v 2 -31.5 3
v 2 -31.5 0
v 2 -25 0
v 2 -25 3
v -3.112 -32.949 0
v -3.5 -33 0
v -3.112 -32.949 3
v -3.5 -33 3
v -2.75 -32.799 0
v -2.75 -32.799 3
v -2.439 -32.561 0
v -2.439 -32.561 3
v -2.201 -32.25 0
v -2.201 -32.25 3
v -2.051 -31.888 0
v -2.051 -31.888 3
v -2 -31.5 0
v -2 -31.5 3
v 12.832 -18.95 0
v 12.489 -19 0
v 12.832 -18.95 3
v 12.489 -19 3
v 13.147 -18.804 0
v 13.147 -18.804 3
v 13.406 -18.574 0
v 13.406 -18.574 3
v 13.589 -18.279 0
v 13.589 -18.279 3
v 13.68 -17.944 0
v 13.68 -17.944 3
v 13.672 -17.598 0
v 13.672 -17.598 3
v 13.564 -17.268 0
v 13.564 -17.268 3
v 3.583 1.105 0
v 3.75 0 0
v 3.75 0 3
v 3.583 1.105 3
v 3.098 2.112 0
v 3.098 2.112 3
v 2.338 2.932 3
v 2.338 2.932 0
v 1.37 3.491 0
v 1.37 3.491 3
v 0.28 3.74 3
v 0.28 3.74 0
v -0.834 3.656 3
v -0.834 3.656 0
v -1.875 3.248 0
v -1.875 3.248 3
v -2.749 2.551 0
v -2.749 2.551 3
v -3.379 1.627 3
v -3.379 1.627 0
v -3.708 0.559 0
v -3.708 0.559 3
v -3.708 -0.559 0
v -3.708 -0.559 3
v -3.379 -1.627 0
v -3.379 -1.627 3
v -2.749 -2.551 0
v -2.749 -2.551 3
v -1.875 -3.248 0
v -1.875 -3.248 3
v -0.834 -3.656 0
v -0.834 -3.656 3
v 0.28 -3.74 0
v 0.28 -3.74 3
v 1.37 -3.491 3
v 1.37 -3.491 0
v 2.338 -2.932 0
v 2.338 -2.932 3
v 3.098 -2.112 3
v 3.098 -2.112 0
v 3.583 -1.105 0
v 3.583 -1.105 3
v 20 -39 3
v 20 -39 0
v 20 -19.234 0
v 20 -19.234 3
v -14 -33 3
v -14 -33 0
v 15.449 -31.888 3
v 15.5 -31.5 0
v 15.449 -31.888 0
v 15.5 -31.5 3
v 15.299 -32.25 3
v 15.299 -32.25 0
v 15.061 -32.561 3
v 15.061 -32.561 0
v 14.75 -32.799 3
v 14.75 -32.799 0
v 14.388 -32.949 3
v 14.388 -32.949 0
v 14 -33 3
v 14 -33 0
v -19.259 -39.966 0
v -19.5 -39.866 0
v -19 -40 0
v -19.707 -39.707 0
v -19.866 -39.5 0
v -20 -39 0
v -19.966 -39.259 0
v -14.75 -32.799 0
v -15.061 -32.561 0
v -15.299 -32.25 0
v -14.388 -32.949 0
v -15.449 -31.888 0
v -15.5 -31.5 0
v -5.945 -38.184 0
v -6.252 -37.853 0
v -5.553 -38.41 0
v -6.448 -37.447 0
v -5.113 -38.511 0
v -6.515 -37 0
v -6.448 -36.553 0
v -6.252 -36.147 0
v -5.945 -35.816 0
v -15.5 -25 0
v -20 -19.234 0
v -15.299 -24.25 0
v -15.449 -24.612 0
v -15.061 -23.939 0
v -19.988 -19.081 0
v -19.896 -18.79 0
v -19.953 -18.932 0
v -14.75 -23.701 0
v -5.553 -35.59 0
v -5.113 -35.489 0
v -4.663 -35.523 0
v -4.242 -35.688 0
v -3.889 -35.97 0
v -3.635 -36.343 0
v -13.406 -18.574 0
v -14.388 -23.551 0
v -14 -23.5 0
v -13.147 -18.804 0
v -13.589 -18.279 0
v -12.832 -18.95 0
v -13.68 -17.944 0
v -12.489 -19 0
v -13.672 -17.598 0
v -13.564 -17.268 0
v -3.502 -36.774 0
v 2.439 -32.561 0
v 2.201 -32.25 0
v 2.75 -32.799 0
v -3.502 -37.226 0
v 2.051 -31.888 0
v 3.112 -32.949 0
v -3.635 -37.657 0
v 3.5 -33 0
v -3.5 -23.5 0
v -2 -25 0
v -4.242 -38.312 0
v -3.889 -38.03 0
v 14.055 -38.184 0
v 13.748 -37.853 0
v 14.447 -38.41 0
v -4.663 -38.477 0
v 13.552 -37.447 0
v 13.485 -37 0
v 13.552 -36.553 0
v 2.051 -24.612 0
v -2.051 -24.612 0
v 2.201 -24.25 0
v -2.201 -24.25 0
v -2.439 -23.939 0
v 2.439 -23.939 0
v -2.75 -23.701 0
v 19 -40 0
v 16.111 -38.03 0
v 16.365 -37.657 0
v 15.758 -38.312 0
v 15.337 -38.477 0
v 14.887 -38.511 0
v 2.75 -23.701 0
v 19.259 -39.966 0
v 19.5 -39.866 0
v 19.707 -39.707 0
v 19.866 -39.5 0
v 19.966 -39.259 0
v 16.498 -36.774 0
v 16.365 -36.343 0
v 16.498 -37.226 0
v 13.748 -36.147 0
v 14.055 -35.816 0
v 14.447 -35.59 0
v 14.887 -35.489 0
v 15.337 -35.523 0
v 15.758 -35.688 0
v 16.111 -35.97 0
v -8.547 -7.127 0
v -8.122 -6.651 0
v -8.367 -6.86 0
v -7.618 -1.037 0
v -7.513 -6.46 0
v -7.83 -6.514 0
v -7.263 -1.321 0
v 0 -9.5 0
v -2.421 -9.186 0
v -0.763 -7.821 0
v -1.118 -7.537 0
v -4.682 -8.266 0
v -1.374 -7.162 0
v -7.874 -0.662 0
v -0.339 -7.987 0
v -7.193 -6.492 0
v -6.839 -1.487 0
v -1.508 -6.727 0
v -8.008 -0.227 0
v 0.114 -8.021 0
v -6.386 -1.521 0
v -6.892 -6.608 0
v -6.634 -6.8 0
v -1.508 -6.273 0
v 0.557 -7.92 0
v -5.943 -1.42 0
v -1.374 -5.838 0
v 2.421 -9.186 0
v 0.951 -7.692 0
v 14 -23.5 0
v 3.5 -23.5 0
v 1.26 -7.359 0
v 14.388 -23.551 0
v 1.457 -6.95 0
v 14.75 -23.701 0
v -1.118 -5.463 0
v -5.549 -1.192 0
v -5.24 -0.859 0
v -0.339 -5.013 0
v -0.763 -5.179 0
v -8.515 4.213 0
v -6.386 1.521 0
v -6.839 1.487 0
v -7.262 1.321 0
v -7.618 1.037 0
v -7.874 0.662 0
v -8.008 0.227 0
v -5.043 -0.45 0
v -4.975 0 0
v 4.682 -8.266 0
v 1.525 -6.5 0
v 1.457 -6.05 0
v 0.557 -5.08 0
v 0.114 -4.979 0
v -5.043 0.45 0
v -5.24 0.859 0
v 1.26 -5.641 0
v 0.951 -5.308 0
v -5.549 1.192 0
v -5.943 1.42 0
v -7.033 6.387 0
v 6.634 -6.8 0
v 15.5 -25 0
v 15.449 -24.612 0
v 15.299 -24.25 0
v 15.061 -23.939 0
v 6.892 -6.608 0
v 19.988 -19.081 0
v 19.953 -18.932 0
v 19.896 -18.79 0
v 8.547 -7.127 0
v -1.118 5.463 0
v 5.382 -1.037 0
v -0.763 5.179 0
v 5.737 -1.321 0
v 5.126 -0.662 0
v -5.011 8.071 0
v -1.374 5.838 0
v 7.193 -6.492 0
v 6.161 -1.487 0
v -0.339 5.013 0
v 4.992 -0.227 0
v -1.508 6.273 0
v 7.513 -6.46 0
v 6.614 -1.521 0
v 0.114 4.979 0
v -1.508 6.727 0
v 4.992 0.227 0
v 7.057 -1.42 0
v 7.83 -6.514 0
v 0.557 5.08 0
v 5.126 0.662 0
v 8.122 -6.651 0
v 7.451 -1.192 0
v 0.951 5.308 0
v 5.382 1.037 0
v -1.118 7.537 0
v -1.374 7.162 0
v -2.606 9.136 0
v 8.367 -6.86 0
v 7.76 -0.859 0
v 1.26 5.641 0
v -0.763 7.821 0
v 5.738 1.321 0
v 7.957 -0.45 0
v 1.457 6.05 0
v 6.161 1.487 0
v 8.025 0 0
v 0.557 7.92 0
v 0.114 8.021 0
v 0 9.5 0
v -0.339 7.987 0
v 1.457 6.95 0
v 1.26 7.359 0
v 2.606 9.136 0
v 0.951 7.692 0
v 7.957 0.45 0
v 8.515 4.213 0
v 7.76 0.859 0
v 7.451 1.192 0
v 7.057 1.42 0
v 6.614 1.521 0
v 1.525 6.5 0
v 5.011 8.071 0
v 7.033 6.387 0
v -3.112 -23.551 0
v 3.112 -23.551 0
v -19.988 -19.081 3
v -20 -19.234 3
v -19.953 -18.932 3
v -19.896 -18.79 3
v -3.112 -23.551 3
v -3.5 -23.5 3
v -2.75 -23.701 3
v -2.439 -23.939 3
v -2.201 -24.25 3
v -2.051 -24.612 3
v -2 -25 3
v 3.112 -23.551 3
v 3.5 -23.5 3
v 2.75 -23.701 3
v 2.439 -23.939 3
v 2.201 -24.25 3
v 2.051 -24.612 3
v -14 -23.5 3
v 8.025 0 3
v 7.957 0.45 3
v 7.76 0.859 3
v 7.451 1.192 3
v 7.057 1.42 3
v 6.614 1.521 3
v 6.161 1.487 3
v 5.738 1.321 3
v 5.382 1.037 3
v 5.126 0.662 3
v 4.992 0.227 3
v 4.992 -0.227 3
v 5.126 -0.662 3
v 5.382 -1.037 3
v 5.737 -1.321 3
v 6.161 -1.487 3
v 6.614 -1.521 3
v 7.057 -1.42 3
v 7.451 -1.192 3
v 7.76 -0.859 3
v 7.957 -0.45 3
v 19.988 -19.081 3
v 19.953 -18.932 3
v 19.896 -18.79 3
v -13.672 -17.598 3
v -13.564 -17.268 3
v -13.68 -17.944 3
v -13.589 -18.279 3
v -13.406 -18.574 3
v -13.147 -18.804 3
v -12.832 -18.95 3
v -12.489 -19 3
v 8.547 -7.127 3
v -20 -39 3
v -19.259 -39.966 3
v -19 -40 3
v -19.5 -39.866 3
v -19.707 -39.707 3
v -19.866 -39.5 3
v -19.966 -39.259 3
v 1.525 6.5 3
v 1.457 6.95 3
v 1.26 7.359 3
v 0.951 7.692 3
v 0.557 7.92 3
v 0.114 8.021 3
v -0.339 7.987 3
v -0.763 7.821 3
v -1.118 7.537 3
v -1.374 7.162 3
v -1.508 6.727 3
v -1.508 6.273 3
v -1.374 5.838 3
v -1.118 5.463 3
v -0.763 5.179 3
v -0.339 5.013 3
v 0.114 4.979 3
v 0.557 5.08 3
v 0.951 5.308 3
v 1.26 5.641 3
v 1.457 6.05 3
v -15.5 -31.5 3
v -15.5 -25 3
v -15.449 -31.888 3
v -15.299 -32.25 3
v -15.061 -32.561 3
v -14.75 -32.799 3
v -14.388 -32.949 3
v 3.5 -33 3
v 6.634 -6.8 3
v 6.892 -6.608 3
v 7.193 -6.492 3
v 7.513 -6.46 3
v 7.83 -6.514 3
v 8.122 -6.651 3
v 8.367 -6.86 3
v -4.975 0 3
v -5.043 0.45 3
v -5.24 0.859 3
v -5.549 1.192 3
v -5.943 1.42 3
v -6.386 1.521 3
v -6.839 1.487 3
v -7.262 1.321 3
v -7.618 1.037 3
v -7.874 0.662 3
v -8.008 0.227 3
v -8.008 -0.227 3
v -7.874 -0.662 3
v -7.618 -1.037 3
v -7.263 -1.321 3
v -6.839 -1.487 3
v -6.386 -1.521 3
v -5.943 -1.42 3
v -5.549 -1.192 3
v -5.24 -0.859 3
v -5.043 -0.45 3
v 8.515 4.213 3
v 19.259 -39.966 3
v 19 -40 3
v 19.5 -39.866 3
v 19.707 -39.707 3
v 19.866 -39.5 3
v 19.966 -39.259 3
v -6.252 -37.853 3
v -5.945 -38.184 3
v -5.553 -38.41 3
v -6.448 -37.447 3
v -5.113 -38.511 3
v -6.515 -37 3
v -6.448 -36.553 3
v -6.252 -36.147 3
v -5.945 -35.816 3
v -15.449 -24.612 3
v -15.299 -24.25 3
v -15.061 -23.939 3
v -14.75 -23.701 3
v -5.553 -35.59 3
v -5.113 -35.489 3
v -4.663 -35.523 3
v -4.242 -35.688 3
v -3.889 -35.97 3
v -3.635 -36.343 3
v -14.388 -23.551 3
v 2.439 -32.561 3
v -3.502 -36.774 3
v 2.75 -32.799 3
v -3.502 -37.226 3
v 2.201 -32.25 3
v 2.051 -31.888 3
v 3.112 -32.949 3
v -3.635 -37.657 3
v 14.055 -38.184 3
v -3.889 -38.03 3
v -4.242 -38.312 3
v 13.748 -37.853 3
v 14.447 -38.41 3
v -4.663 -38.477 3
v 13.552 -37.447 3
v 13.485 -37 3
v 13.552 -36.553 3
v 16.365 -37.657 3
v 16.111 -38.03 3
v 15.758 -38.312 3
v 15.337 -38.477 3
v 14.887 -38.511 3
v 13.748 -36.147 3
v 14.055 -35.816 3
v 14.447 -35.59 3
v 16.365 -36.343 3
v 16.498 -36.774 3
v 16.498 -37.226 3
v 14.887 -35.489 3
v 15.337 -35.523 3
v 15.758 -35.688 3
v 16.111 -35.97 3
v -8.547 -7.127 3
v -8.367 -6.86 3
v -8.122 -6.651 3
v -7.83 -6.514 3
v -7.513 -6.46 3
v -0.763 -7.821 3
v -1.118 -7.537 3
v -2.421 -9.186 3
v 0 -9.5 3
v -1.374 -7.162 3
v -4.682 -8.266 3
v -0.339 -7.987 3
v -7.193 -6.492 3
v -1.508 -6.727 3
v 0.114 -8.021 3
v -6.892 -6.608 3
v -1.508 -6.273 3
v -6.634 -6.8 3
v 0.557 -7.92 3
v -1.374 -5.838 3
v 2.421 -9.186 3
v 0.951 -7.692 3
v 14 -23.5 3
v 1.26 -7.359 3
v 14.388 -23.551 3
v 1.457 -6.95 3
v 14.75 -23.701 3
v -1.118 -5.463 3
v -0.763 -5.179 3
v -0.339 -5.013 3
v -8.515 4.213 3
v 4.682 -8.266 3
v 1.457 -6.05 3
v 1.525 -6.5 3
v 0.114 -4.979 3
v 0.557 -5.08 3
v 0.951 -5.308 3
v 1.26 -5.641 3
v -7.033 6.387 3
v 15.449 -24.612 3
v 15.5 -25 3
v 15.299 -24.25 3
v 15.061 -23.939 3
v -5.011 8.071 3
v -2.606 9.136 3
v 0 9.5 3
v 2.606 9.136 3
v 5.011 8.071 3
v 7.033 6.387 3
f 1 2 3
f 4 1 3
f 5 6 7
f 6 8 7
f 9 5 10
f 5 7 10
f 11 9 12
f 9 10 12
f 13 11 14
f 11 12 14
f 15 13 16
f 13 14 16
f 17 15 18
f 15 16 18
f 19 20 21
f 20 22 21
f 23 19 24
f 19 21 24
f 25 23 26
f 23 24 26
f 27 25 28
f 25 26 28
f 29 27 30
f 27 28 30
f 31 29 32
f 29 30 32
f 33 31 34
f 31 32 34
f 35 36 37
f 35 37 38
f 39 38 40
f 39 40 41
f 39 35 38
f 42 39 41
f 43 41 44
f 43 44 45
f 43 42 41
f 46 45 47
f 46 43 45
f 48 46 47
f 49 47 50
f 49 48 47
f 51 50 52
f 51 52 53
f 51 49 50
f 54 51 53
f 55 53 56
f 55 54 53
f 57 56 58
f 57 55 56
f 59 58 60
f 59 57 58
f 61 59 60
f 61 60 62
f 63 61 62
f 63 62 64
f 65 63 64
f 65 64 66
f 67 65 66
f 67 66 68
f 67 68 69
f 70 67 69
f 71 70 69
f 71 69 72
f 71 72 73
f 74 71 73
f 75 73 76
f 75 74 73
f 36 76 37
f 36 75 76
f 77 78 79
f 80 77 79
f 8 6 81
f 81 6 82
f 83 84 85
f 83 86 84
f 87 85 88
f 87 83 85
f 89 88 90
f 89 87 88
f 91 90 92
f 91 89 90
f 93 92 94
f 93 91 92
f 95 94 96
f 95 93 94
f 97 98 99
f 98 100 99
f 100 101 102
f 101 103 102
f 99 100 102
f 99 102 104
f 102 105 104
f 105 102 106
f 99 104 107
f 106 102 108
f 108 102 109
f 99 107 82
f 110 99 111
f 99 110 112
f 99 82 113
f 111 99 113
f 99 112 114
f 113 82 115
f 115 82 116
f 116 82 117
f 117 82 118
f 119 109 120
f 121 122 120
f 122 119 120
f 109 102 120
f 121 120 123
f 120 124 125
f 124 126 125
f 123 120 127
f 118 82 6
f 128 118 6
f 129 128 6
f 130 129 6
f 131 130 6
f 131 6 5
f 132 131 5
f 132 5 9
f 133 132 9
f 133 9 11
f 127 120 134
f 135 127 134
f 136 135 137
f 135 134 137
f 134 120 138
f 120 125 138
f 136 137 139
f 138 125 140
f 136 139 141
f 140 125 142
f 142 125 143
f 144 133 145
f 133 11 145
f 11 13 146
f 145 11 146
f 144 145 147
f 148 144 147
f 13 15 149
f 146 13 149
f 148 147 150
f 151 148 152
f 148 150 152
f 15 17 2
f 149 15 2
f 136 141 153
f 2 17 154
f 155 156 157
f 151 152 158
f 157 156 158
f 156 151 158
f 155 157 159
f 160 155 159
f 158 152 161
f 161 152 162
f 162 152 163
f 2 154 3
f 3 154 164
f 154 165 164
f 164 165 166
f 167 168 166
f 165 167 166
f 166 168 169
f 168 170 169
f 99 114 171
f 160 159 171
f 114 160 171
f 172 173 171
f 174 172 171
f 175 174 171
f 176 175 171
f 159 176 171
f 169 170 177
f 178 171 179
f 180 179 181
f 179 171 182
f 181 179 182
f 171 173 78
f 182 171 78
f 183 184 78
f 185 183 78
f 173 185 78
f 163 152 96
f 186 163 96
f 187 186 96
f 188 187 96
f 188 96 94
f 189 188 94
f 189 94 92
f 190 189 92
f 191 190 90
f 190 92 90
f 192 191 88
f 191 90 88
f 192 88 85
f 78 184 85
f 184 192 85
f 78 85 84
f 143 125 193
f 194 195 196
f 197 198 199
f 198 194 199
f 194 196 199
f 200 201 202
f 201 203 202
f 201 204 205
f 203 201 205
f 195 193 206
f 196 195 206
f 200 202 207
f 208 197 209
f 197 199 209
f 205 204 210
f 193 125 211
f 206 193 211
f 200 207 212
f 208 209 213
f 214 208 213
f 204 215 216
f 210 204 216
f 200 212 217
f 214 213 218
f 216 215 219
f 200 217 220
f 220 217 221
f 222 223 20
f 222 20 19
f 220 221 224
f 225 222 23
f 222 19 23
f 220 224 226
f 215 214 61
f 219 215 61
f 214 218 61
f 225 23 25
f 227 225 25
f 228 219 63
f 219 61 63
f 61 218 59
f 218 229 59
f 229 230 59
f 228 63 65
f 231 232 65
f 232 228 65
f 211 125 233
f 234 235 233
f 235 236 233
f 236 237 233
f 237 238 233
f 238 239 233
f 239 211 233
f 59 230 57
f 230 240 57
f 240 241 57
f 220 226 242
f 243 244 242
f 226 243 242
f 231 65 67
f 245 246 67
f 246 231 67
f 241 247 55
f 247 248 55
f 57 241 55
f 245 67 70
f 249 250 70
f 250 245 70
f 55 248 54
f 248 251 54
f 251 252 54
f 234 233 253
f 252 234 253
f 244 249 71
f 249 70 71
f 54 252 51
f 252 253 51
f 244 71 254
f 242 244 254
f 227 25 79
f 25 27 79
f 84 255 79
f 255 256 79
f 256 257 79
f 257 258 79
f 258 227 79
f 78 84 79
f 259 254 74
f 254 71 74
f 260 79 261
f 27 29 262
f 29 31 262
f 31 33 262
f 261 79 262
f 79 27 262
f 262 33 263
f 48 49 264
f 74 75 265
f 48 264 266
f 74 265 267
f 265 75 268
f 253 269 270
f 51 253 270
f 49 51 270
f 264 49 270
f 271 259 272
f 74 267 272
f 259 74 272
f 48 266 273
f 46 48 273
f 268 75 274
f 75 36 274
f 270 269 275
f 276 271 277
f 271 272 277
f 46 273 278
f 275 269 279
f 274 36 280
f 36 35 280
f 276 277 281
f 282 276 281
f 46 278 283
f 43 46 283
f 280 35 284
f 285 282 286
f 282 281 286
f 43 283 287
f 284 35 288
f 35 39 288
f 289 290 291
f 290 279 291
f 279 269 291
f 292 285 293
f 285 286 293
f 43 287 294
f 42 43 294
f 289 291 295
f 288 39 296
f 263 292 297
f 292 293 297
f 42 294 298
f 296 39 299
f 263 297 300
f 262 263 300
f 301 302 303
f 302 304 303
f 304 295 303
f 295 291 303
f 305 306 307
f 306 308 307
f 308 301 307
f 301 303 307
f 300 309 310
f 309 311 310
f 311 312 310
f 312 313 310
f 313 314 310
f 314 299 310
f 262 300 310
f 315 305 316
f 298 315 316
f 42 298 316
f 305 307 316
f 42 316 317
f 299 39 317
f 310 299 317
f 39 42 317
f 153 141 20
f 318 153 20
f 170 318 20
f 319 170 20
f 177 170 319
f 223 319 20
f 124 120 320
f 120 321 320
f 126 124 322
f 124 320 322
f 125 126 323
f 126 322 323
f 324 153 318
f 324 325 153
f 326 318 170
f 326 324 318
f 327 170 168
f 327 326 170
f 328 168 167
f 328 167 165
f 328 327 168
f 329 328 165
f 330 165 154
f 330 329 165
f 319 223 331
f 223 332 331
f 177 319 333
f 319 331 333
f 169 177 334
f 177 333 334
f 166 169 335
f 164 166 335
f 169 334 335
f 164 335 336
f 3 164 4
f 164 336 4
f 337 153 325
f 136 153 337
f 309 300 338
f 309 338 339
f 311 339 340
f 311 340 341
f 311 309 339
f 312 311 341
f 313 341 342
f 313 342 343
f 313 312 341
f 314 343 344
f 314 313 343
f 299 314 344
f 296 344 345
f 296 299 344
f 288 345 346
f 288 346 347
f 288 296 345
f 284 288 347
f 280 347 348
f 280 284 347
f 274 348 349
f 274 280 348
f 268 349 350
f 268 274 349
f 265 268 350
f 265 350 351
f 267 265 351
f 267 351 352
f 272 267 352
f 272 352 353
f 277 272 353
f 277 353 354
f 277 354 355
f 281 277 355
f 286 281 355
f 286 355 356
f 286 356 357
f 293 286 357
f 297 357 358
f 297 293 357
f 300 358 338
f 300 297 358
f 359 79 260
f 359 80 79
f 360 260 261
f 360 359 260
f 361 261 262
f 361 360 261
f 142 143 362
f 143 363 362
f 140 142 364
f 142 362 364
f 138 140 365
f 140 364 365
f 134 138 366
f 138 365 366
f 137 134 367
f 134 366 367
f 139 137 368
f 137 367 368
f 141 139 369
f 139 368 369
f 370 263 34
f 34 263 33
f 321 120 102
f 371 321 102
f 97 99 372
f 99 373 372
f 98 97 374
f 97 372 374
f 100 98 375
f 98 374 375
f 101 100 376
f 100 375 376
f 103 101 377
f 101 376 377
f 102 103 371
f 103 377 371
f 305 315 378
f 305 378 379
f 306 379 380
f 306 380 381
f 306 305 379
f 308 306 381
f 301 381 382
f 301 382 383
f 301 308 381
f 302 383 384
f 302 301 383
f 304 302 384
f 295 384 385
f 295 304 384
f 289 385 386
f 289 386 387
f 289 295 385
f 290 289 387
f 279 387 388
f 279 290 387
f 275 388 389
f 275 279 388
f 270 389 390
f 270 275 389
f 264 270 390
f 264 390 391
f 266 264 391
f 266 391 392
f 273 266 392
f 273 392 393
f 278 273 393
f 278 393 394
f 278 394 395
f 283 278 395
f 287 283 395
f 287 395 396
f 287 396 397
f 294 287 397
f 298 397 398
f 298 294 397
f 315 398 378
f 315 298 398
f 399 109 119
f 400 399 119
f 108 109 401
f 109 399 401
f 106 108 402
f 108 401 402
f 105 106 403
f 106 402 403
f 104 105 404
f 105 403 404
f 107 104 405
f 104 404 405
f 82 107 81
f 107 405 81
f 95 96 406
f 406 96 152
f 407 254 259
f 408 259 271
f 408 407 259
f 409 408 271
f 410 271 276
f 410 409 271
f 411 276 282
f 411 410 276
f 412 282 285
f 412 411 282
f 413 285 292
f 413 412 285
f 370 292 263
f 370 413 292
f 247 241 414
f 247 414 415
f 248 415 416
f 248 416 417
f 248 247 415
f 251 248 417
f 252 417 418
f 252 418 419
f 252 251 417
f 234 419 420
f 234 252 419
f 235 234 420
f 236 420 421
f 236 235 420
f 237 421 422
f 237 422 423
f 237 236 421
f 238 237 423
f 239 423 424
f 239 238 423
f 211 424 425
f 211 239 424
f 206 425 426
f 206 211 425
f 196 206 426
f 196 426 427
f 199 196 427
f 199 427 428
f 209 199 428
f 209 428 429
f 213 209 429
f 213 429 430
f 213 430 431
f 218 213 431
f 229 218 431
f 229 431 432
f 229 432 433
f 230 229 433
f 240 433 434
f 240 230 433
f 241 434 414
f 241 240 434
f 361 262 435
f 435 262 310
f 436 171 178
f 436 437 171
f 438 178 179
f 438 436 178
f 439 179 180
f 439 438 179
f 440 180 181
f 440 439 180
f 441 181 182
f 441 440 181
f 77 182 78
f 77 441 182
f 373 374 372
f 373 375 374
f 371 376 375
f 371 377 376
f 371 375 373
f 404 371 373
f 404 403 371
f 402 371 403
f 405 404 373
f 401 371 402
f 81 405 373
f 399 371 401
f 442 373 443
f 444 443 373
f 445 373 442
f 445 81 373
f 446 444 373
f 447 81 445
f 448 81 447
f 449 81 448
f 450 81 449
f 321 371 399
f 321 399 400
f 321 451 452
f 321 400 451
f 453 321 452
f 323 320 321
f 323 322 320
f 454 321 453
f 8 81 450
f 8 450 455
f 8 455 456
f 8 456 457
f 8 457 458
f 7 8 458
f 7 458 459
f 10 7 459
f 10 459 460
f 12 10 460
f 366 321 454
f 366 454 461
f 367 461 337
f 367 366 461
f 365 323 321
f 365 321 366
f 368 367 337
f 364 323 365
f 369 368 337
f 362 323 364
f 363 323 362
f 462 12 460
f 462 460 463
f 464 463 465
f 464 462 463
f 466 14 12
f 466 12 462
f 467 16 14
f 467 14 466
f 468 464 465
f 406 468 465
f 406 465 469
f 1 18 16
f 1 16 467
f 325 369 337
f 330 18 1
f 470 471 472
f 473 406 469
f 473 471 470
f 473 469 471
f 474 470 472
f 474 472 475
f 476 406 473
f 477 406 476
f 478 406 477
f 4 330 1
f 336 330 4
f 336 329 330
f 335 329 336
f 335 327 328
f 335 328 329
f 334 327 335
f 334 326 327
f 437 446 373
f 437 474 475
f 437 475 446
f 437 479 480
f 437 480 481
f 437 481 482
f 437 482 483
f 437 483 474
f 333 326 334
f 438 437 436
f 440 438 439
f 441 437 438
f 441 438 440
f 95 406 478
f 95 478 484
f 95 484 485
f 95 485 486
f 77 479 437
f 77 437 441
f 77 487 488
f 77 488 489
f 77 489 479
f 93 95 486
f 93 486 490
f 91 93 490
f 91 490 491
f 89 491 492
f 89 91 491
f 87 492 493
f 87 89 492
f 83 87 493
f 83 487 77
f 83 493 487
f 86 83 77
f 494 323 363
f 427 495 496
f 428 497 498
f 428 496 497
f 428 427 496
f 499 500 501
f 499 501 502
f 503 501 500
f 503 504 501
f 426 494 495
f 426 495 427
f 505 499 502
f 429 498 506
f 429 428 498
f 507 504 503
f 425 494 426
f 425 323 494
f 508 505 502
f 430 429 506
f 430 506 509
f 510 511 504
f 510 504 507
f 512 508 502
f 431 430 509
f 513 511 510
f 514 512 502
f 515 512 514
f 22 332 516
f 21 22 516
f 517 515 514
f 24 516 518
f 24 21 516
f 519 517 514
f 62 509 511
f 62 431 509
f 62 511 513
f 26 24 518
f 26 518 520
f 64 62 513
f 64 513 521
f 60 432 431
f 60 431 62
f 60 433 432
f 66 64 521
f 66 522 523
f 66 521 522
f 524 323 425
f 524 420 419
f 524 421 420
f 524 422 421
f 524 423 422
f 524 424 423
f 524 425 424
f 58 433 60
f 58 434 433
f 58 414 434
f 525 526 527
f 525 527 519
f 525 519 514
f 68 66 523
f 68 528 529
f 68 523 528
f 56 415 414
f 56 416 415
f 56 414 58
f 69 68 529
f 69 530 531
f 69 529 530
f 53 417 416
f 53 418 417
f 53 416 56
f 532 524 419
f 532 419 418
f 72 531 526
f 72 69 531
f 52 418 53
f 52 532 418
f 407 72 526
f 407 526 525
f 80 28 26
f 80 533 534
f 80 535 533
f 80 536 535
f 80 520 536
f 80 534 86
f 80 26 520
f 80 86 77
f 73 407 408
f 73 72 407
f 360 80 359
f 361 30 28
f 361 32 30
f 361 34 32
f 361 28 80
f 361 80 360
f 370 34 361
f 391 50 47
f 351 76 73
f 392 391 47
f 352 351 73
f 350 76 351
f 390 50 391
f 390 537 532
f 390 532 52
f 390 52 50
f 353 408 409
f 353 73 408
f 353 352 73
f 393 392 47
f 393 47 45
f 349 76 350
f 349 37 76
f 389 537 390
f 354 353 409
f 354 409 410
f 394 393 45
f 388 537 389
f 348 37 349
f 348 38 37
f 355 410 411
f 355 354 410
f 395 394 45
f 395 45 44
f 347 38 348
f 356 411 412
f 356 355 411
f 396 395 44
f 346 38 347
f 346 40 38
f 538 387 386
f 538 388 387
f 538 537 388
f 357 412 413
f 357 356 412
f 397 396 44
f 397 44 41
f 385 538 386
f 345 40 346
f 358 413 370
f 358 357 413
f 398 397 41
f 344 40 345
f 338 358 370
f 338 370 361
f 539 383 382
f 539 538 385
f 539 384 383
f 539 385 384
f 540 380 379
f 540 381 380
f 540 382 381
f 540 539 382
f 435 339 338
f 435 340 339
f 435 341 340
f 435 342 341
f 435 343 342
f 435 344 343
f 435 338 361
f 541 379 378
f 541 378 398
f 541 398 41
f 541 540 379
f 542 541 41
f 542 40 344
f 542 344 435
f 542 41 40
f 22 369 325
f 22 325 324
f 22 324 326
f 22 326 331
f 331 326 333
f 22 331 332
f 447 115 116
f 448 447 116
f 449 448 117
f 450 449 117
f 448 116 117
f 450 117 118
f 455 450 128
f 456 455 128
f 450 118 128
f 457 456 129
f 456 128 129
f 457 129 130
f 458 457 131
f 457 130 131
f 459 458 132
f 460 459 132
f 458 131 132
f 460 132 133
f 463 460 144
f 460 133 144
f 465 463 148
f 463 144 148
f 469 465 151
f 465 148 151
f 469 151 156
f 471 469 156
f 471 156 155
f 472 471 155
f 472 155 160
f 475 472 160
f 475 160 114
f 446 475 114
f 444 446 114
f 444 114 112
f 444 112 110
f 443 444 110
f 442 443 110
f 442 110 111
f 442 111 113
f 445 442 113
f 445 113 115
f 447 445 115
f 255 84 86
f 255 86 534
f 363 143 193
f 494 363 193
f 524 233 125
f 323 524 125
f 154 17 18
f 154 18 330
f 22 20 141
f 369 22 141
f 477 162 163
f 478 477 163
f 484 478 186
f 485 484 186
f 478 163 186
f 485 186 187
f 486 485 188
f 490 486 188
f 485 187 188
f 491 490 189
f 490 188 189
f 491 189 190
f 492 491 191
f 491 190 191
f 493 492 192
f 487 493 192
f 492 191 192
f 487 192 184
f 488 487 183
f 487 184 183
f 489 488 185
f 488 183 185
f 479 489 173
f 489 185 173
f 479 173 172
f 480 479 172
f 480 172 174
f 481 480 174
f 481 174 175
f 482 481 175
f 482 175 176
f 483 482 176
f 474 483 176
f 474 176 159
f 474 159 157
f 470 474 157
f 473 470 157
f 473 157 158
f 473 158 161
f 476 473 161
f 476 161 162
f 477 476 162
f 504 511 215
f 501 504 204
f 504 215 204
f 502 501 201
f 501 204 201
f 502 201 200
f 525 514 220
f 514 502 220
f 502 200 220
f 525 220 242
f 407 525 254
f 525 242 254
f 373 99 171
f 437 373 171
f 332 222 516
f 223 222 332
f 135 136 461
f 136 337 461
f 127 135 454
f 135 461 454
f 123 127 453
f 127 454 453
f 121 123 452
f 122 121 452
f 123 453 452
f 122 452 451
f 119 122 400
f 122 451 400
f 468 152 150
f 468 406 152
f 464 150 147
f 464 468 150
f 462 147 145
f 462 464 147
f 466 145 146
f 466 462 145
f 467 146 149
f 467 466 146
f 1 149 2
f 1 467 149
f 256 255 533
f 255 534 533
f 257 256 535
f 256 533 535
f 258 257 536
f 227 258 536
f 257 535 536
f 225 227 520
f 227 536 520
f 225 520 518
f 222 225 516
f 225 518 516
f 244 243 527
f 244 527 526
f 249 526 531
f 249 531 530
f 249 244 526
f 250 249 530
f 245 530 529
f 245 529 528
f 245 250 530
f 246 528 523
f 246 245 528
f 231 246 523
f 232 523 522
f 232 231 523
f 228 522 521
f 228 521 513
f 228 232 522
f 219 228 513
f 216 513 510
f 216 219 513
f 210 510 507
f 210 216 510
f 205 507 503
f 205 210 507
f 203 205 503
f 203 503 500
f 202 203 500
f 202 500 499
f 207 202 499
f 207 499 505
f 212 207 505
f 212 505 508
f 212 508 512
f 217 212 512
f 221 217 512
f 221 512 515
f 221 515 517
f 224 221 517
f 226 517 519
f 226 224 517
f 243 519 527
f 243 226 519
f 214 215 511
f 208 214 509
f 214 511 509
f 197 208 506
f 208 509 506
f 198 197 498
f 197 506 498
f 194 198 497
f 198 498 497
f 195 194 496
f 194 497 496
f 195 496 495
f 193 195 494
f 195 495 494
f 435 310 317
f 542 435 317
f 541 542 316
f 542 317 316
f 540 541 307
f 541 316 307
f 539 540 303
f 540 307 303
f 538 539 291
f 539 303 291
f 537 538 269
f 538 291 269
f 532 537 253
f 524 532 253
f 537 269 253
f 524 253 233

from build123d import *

# Parameters (mm, degrees)
SKETCH_1_R          = 1.525
SKETCH_1_R_2        = 3.75
EXTRUDE_1_DEPTH     = 3
FILLET_1_R          = 1
SKETCH_2_R          = 1.515
CUT_EXTRUDE_1_DEPTH = 10
CUT_EXTRUDE_2_DEPTH = 10
FILLET_2_R          = 1.2
SKETCH_4_W          = 31
SKETCH_4_H          = 9.5
CUT_EXTRUDE_3_DEPTH = 10
SKETCH_5_W          = 4
SKETCH_5_H          = 9.5
EXTRUDE_1_2_DEPTH   = 3
FILLET_3_R          = 1.5


with BuildPart() as part:
    # 草图1 → Extrude 1 (new body)
    with BuildSketch(Plane.XY):
        with BuildLine():
            Line((-20, -40), (20, -40))
            Line((20, -40), (20, -19))
            Line((20, -19), (8.514771251, 4.212917106))
            ThreePointArc((8.514771251, 4.212917106), (0, 9.5), (-8.514771251, 4.212917106))
            Line((-8.514771251, 4.212917106), (-20, -19))
            Line((-20, -19), (-20, -40))
        make_face()
        with Locations((0, 6.5)):
            Circle(SKETCH_1_R, mode=Mode.SUBTRACT)
        with Locations((6.5, 0)):
            Circle(SKETCH_1_R, mode=Mode.SUBTRACT)
        with Locations((0, -6.5)):
            Circle(SKETCH_1_R, mode=Mode.SUBTRACT)
        with Locations((-6.5, 0)):
            Circle(SKETCH_1_R, mode=Mode.SUBTRACT)
        Circle(SKETCH_1_R_2, mode=Mode.SUBTRACT)
    extrude(amount=EXTRUDE_1_DEPTH)

    # 圆角1
    fillet_1_edges = [part.edges().sort_by_distance(p)[0] for p in [
        (20, -40, 1.5),
        (-20, -40, 1.5),
        (-20, -19, 1.5),
        (20, -19, 1.5),
    ]]
    fillet(fillet_1_edges, radius=FILLET_1_R)

    # 草图2 → 切除-拉伸1 (cut)
    with BuildSketch(Plane(origin=(0, 0, 0), x_dir=(-1, 0, 0), z_dir=(0, 0, -1))):
        with Locations((-15, -37)):
            Circle(SKETCH_2_R)
        with Locations((5, -37)):
            Circle(SKETCH_2_R)
    extrude(amount=-CUT_EXTRUDE_1_DEPTH, mode=Mode.SUBTRACT)

    # 草图3 → 切除-拉伸2 (cut)
    with BuildSketch(Plane(origin=(0, 0, 0), x_dir=(-1, 0, 0), z_dir=(0, 0, -1))):
        with BuildLine():
            Line((-7.743606738, -5.50332215), (-14.421459062, -19))
            Line((-14.421459062, -19), (14.421459062, -19))
            Line((14.421459062, -19), (7.743606738, -5.50332215))
            ThreePointArc((7.743606738, -5.50332215), (0, -9.5), (-7.743606738, -5.50332215))
        make_face()
    extrude(amount=-CUT_EXTRUDE_2_DEPTH, mode=Mode.SUBTRACT)

    # 圆角2
    fillet_2_edges = [part.edges().sort_by_distance(p)[0] for p in [
        (7.743606738, -5.50332215, 1.5),
        (-7.743606738, -5.50332215, 1.5),
        (-14.421459062, -19, 1.5),
        (14.421459062, -19, 1.5),
    ]]
    fillet(fillet_2_edges, radius=FILLET_2_R)

    # 草图4 → 切除-拉伸3 (cut)
    with BuildSketch(Plane(origin=(0, 0, 0), x_dir=(-1, 0, 0), z_dir=(0, 0, -1))):
        with Locations((0, -28.25)):
            Rectangle(SKETCH_4_W, SKETCH_4_H)
    extrude(amount=-CUT_EXTRUDE_3_DEPTH, mode=Mode.SUBTRACT)

    # 草图5 → Extrude 1 2 (add)
    with BuildSketch(Plane(origin=(0, 0, 0), x_dir=(-1, 0, 0), z_dir=(0, 0, -1))):
        with Locations((0, -28.25)):
            Rectangle(SKETCH_5_W, SKETCH_5_H)
    extrude(amount=-EXTRUDE_1_2_DEPTH)

    # 圆角3
    fillet_3_edges = [part.edges().sort_by_distance(p)[0] for p in [
        (15.5, -33, 1.5),
        (15.5, -23.5, 1.5),
        (-15.5, -23.5, 1.5),
        (-15.5, -33, 1.5),
        (2, -33, 1.5),
        (2, -23.5, 1.5),
        (-2, -23.5, 1.5),
        (-2, -33, 1.5),
    ]]
    fillet(fillet_3_edges, radius=FILLET_3_R)


solid = part.part
